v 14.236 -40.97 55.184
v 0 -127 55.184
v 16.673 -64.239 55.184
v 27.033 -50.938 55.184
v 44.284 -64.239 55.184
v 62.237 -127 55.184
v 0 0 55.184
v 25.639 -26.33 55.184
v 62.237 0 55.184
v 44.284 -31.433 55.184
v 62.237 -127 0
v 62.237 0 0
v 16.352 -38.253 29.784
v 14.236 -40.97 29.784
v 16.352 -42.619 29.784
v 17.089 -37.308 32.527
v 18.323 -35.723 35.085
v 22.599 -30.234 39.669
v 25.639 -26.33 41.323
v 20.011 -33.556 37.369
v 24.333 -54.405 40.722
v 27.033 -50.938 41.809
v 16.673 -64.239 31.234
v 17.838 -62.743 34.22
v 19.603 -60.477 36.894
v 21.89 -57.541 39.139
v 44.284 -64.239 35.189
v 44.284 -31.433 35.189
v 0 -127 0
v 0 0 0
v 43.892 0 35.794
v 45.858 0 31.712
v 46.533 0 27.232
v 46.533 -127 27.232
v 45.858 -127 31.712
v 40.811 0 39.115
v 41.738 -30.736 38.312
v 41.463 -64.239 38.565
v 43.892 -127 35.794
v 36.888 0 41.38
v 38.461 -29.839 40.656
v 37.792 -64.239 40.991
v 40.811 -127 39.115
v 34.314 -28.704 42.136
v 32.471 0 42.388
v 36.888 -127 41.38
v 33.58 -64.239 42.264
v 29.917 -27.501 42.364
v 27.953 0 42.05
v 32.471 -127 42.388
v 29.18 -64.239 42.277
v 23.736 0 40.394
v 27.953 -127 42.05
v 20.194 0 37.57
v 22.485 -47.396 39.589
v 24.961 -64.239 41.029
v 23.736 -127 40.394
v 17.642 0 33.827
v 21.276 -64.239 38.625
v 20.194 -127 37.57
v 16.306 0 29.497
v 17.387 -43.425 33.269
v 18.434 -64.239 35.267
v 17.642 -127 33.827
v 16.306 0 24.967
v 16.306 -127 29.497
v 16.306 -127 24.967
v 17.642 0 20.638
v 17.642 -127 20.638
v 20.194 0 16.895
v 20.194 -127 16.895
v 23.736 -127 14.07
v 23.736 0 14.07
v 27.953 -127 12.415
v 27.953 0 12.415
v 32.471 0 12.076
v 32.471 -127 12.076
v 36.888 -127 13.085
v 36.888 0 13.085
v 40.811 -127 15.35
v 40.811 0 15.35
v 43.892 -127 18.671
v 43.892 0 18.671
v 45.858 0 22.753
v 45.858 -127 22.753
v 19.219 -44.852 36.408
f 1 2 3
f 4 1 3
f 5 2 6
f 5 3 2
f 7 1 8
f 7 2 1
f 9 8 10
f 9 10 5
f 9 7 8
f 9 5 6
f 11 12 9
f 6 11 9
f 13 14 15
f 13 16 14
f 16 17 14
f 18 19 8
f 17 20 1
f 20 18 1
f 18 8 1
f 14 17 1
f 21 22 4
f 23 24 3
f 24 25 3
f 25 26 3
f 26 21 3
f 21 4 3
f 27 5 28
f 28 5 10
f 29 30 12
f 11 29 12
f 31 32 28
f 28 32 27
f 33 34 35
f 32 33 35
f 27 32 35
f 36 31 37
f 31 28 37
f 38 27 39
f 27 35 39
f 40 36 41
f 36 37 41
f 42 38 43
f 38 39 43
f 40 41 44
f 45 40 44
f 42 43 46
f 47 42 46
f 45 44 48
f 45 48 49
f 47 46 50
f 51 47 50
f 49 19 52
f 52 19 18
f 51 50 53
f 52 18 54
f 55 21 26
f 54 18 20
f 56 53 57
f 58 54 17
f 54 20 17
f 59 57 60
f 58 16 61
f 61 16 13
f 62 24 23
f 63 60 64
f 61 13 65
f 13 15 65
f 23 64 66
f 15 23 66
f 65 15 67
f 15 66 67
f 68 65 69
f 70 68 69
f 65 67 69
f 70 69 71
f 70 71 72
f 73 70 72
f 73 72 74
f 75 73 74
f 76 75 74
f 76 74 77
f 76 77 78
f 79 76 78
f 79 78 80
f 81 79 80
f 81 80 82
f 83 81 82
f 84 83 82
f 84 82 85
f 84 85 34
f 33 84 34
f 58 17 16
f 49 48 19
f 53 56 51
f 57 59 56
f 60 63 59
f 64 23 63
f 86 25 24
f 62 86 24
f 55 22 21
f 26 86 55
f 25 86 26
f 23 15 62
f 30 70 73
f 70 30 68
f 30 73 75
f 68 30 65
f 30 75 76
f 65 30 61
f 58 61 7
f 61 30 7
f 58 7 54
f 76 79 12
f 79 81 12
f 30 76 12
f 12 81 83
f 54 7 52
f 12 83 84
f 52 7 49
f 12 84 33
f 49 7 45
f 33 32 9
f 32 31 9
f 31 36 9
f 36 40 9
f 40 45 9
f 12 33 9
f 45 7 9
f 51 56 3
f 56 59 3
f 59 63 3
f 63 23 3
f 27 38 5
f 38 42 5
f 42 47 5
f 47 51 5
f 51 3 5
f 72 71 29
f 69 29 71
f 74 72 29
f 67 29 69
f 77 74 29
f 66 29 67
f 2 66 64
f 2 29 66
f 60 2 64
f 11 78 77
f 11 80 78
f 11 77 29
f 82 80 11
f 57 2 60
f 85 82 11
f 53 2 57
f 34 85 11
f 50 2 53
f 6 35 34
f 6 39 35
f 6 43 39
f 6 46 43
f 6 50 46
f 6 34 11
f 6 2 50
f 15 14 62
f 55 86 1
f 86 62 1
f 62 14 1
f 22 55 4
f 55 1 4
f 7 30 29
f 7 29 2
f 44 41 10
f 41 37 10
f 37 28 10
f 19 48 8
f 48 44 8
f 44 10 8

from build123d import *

# Parameters (mm, degrees)
F0_W     = 62.237114
F0_H     = 55.183612
F1_DEPTH = 127
F2_R     = 15.198366
F3_DEPTH = 127
F5_DEPTH = 25.4


with BuildPart() as f1:
    # F0 (on Front) → F1 (new body)
    with BuildSketch(Plane.XZ):
        with Locations((31.118557, 27.591806)):
            Rectangle(F0_W, F0_H)
    extrude(amount=F1_DEPTH)

    # F2 (on face) → F3 (cut)
    with BuildSketch(Plane.XZ.offset(127)):
        with Locations((31.334992, 27.2323)):
            Circle(F2_R)
    extrude(amount=-F3_DEPTH, mode=Mode.SUBTRACT)

    # F4 (on face) → F5 (cut)
    with BuildSketch(Plane.XY.offset(55.183612)):
        Polygon((44.284318, -31.432733), (25.63932, -26.329752), (14.235882, -40.970355), (27.033182, -50.93806), (16.672973, -64.239287), (44.284318, -64.239287), align=None)
    extrude(amount=-F5_DEPTH, mode=Mode.SUBTRACT)


solid = f1.part
